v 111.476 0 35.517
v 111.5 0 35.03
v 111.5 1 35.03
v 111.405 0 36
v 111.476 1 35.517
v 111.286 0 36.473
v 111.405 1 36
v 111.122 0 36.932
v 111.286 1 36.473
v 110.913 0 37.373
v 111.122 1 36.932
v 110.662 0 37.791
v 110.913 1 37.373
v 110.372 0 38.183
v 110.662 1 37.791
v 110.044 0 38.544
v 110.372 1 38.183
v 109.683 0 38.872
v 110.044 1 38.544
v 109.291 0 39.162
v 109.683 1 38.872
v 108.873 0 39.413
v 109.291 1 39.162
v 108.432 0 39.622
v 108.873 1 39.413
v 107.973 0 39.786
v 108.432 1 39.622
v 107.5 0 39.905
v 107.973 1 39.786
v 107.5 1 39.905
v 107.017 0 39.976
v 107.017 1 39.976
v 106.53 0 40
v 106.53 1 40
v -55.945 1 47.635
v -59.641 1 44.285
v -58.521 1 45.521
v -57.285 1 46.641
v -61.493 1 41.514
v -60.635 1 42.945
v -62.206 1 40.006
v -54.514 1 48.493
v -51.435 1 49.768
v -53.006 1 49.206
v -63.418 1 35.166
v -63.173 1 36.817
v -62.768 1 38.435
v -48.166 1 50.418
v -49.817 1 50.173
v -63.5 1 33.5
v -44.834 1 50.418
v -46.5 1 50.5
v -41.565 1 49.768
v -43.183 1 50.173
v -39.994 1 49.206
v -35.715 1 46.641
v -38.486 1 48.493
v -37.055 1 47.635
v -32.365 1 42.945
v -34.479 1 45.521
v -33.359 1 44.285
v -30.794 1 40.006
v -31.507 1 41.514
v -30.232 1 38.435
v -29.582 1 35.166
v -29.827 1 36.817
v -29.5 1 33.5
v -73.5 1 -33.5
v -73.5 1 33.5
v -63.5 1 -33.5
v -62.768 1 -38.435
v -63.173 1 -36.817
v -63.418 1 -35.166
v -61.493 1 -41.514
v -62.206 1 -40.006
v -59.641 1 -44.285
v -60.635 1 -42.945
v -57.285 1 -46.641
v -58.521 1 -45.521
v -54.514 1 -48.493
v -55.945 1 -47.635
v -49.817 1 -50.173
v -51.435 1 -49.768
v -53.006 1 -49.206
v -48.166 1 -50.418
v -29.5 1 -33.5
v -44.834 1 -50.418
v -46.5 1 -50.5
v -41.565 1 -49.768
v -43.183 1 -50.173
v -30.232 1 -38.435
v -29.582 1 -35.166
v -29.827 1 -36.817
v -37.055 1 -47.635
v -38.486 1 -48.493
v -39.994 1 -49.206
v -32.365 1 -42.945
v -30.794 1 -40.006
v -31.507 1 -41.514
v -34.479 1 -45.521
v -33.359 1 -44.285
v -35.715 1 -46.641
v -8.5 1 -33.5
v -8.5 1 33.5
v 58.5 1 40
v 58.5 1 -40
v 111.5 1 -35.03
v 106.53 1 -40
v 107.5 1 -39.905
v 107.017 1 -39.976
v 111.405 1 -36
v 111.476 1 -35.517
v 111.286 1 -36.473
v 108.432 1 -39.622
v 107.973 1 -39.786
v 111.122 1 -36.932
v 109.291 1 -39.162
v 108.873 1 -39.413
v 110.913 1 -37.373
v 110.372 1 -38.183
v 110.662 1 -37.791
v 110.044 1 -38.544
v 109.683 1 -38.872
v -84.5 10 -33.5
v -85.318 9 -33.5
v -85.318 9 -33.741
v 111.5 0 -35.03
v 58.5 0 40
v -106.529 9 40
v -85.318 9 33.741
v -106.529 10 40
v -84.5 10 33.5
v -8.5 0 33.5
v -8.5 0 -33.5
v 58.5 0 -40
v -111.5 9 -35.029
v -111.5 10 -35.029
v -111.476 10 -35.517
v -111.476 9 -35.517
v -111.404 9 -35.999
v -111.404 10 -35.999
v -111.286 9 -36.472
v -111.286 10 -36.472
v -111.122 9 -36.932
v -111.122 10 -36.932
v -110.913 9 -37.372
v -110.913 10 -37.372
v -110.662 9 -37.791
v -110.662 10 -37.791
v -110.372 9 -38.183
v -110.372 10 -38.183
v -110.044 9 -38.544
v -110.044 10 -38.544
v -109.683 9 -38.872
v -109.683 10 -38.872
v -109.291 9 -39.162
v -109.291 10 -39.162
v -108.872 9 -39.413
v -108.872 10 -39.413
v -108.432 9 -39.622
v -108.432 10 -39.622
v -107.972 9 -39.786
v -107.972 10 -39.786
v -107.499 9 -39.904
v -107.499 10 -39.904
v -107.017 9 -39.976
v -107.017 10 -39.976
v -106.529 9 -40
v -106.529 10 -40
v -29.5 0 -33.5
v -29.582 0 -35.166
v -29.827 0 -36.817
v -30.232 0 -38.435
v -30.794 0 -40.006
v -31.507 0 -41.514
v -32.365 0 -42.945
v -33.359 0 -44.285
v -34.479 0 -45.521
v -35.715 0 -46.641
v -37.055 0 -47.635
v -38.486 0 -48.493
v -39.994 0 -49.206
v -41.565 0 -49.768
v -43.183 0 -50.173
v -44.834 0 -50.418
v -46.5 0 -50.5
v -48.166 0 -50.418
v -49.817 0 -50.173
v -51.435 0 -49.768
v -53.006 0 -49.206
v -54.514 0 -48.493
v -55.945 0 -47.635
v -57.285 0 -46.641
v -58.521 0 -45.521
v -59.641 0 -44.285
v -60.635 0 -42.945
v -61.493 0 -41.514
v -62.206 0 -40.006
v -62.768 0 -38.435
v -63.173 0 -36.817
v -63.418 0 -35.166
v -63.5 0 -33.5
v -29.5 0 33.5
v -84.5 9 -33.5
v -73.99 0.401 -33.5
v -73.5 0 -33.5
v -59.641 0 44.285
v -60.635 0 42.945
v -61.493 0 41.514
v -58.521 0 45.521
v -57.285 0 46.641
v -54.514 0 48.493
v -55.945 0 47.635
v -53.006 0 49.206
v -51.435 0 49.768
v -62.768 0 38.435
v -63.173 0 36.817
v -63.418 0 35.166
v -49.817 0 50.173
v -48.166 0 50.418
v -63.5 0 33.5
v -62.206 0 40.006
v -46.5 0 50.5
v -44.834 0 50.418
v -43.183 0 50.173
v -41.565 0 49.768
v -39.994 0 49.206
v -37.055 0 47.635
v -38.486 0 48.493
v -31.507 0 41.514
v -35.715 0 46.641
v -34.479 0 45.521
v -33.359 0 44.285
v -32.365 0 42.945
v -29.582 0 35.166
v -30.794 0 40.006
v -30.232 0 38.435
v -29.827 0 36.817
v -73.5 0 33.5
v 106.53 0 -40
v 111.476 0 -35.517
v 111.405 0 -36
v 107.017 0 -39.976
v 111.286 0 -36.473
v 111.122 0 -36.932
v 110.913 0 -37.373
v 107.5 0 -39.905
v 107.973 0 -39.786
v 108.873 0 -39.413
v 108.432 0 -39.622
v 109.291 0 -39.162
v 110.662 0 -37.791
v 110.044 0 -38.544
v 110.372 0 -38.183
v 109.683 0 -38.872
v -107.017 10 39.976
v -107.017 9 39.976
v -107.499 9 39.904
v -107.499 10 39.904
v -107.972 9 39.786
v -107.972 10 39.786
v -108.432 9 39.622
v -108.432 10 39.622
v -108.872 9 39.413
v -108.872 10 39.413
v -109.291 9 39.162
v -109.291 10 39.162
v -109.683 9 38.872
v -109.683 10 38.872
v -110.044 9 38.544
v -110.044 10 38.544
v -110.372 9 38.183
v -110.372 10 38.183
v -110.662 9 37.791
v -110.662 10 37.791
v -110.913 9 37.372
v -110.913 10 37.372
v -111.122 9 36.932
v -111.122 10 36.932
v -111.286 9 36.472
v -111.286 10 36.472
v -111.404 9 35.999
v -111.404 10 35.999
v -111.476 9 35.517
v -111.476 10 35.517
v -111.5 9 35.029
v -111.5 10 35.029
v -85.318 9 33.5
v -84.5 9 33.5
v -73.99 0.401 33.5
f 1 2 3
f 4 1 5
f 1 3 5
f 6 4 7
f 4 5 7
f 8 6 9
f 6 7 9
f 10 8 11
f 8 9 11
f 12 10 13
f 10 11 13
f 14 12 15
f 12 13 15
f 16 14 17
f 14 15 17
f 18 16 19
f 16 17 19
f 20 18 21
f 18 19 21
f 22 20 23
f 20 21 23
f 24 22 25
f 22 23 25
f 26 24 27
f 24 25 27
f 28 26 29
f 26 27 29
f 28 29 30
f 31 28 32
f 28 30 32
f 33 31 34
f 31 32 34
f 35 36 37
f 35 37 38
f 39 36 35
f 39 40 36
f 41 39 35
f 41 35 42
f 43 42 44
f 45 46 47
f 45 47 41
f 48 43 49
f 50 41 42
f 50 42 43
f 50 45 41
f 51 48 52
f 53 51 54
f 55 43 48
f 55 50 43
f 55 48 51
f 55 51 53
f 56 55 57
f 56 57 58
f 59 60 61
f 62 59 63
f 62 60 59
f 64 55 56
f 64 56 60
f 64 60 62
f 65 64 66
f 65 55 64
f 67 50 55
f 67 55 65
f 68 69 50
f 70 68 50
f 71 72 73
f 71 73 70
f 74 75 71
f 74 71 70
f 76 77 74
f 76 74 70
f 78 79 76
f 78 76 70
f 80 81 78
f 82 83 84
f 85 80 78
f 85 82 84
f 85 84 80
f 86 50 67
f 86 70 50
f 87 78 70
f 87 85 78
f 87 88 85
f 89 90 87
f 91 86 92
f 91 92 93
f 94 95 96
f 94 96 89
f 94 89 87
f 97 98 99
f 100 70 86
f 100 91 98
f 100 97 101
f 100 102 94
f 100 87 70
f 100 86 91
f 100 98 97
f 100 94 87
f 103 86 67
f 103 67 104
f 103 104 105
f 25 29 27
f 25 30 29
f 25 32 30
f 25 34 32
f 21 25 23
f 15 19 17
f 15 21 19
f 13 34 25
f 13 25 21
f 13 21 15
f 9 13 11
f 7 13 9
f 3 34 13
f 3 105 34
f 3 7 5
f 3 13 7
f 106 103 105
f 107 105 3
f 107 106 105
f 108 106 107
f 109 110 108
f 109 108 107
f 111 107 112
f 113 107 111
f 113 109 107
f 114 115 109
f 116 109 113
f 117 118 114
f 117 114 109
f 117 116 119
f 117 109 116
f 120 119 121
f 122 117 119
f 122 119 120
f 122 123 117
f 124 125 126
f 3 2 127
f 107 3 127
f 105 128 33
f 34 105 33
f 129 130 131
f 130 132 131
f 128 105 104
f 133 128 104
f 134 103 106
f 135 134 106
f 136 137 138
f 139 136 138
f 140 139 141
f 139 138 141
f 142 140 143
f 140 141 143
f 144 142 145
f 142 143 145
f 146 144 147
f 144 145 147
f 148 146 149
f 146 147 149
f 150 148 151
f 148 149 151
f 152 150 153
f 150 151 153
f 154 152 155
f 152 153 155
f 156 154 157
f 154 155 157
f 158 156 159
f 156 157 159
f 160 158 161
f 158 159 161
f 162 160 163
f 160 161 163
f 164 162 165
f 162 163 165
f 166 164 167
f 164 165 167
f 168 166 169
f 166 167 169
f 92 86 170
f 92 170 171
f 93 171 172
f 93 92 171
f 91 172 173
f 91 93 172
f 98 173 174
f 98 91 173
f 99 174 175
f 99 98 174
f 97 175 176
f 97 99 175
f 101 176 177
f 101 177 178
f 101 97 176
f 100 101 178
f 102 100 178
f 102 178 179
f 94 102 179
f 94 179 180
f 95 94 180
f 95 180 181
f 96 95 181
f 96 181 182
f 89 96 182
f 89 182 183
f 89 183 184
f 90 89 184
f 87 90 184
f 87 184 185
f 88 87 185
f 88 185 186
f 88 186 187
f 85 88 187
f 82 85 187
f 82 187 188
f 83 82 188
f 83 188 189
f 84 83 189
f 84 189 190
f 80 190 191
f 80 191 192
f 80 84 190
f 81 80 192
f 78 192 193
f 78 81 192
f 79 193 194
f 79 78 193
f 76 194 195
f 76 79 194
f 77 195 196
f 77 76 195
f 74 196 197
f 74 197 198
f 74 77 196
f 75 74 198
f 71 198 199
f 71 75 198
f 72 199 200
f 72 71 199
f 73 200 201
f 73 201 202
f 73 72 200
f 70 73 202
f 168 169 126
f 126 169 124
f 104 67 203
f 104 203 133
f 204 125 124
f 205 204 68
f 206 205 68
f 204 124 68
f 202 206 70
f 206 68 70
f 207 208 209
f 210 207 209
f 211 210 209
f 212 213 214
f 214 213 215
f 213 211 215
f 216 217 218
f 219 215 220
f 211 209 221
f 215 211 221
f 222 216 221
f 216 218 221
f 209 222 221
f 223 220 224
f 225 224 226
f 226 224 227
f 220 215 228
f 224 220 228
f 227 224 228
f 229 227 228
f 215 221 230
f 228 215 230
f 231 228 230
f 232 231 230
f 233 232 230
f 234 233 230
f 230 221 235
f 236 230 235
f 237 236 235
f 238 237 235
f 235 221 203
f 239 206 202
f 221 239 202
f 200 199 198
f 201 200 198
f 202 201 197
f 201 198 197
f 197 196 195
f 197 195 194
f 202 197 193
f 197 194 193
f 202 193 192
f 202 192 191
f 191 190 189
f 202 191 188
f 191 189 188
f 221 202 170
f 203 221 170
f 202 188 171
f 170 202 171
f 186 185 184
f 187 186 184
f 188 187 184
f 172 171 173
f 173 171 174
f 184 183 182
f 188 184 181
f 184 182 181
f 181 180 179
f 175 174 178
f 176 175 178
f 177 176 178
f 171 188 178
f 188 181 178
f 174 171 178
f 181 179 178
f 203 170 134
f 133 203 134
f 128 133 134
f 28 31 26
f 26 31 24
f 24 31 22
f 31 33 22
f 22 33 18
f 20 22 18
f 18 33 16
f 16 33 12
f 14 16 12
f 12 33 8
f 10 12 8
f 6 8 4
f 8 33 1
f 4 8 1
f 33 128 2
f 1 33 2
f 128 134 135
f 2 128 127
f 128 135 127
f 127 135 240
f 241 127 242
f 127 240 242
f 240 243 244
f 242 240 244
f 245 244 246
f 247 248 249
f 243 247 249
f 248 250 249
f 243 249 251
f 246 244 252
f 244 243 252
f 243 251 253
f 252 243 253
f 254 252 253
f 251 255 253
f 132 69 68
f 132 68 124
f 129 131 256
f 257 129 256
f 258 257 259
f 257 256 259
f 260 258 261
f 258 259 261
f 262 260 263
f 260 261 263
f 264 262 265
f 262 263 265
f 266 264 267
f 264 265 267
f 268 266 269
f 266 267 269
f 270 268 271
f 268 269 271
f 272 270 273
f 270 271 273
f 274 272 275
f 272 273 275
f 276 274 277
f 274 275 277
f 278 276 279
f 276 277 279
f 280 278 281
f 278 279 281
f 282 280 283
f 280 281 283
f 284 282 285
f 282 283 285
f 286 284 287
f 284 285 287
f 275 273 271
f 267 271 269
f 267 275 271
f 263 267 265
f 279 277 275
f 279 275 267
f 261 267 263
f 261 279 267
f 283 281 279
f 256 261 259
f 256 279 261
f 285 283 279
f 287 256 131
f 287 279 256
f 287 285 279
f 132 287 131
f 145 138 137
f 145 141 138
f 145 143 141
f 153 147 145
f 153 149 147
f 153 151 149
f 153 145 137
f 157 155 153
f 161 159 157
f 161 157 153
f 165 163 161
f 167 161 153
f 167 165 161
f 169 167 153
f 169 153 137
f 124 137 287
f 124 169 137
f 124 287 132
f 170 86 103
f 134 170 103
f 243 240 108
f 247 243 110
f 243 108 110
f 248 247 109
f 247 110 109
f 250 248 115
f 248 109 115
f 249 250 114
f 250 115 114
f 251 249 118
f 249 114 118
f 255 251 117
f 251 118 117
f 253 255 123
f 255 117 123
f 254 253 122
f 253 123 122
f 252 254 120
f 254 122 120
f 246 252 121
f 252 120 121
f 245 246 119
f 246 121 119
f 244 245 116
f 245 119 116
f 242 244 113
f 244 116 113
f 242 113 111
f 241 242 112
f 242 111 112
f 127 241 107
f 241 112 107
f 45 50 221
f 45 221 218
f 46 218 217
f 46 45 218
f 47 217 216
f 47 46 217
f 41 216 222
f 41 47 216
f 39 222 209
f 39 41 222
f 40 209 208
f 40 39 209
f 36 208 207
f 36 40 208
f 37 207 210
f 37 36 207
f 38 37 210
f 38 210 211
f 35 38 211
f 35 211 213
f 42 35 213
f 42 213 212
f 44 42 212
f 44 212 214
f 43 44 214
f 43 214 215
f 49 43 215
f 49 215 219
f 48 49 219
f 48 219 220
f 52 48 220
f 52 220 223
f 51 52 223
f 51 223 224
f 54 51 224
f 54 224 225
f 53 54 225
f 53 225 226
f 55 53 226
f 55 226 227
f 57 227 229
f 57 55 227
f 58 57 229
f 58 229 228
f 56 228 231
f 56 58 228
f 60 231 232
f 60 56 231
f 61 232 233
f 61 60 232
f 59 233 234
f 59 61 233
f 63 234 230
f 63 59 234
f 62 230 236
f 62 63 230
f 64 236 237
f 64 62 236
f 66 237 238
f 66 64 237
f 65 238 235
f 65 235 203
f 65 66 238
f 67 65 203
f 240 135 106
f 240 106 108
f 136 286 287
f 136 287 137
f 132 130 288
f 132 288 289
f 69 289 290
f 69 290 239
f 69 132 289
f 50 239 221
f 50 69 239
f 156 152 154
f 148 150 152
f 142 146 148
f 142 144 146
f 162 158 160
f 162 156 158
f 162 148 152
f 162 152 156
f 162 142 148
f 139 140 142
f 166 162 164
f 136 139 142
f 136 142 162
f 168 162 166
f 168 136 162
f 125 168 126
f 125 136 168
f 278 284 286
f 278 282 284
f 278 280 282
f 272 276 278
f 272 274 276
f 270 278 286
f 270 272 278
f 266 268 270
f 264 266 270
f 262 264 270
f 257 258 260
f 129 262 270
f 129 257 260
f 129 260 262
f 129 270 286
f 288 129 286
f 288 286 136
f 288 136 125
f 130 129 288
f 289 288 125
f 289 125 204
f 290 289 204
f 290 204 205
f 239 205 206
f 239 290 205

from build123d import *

# Parameters (mm, degrees)
SKETCH_1_W          = 223
SKETCH_1_H          = 80
EXTRUDE_1_DEPTH     = 10
SKETCH_3_OUTSIDE_W  = 272.426
SKETCH_3_OUTSIDE_H  = 59.426
CUT_EXTRUDE_1_DEPTH = 138.594512972
CUT_EXTRUDE_2_DEPTH = 119.879140306
CUT_EXTRUDE_3_DEPTH = 119.879140306
SKETCH_7_W          = 14.212670403
SKETCH_7_H          = 6.5
CUT_EXTRUDE_4_DEPTH = 153.966188104
SKETCH_9_W          = 65
SKETCH_9_H          = 6.5
CUT_EXTRUDE_6_DEPTH = 119.799200334
SKETCH_10_W         = 0.633237791
SKETCH_10_H         = 6.5
CUT_EXTRUDE_7_DEPTH = 154.59483235
CUT_EXTRUDE_8_DEPTH = 119.799200334
CUT_EXTRUDE_9_DEPTH = 119.799200334
EXTRUDE_2_DEPTH     = 1


with BuildPart() as part:
    # 스케치1 → 보스-돌출1 (new body)
    with BuildSketch(Plane(origin=(0, 0, 0), x_dir=(1, 0, 0), z_dir=(0, 1, 0))):
        Rectangle(SKETCH_1_W, SKETCH_1_H)
    extrude(amount=EXTRUDE_1_DEPTH)

    # 스케치3 outside → 컷-돌출1 (cut, through all)
    with BuildSketch(Plane.XY.offset(40)):
        with Locations((0, 5)):
            Rectangle(SKETCH_3_OUTSIDE_W, SKETCH_3_OUTSIDE_H)
        Polygon((-111.5, 10), (-111.5, 9), (-84.5, 9), (-73.5, 0), (111.5, 0), (111.5, 1), (-73.5, 1), (-84.5, 10), align=None, mode=Mode.SUBTRACT)
    extrude(amount=-CUT_EXTRUDE_1_DEPTH, mode=Mode.SUBTRACT)

    # 스케치5 → 컷-돌출2 (cut, through all)
    with BuildSketch(Plane(origin=(0, 10, 0), x_dir=(1, 0, 0), z_dir=(0, 1, 0))):
        with BuildLine():
            Line((-111.5, 40), (-111.5, 35.029307783))
            ThreePointArc((-111.5, 35.029307783), (-110.044117957, 38.544117957), (-106.529307783, 40))
            Line((-106.529307783, 40), (-111.5, 40))
        make_face()
        with BuildLine():
            ThreePointArc((-106.529307783, -40), (-110.044117957, -38.544117957), (-111.5, -35.029307783))
            Line((-111.5, -35.029307783), (-111.5, -40))
            Line((-111.5, -40), (-106.529307783, -40))
        make_face()
    extrude(amount=-CUT_EXTRUDE_2_DEPTH, mode=Mode.SUBTRACT)

    # 스케치6 → 컷-돌출3 (cut, through all)
    with BuildSketch(Plane(origin=(0, 10, 0), x_dir=(1, 0, 0), z_dir=(0, 1, 0))):
        Polygon((-106.529307783, 40), (-84.5, 33.5), (-84.5, 40), align=None)
        Polygon((-84.5, -40), (-84.5, -33.5), (-106.529307783, -40), align=None)
    extrude(amount=-CUT_EXTRUDE_3_DEPTH, mode=Mode.SUBTRACT)

    # 스케치7 → 컷-돌출4 (cut, through all)
    with BuildSketch(Plane(origin=(-28.982673267, -35.423267327, 0), x_dir=(0.7739572992033207, -0.6332377902572633, 0), z_dir=(0.6332377902572633, 0.7739572992033207, 0))):
        with Locations((-64.625434484, -36.75)):
            Rectangle(SKETCH_7_W, SKETCH_7_H)
        with Locations((-64.625434484, 36.75)):
            Rectangle(SKETCH_7_W, SKETCH_7_H)
    extrude(amount=-CUT_EXTRUDE_4_DEPTH, mode=Mode.SUBTRACT)

    # 스케치9 → 컷-돌출6 (cut, through all)
    with BuildSketch(Plane(origin=(0, 1, 0), x_dir=(1, 0, 0), z_dir=(0, 1, 0))):
        with Locations((-41, 36.75)):
            Rectangle(SKETCH_9_W, SKETCH_9_H)
        with Locations((-41, -36.75)):
            Rectangle(SKETCH_9_W, SKETCH_9_H)
    extrude(amount=-CUT_EXTRUDE_6_DEPTH, mode=Mode.SUBTRACT)

    # 스케치10 → 컷-돌출7 (cut, through all)
    with BuildSketch(Plane(origin=(-29.472772277, -36.022277228, 0), x_dir=(0.7739572992033206, -0.6332377902572633, 0), z_dir=(-0.6332377902572633, -0.7739572992033206, 0))):
        with Locations((-57.202480386, -36.75)):
            Rectangle(SKETCH_10_W, SKETCH_10_H)
        with Locations((-57.202480386, 36.75)):
            Rectangle(SKETCH_10_W, SKETCH_10_H)
    extrude(amount=-CUT_EXTRUDE_7_DEPTH, mode=Mode.SUBTRACT)

    # 스케치11 → 컷-돌출8 (cut, through all)
    with BuildSketch(Plane(origin=(0, 1, 0), x_dir=(1, 0, 0), z_dir=(0, 1, 0))):
        Polygon((-8.5, -40), (58.5, -40), (-8.5, -33.5), align=None)
        Polygon((-8.5, 33.5), (58.5, 40), (-8.5, 40), align=None)
    extrude(amount=-CUT_EXTRUDE_8_DEPTH, mode=Mode.SUBTRACT)

    # 스케치12 → 컷-돌출9 (cut, through all)
    with BuildSketch(Plane(origin=(0, 1, 0), x_dir=(1, 0, 0), z_dir=(0, 1, 0))):
        with BuildLine():
            Line((111.5, 40), (106.53, 40))
            ThreePointArc((106.53, 40), (110.044320702, 38.544320702), (111.5, 35.03))
            Line((111.5, 35.03), (111.5, 40))
        make_face()
        with BuildLine():
            Line((111.5, -40), (111.5, -35.03))
            ThreePointArc((111.5, -35.03), (110.044320702, -38.544320702), (106.53, -40))
            Line((106.53, -40), (111.5, -40))
        make_face()
    extrude(amount=-CUT_EXTRUDE_9_DEPTH, mode=Mode.SUBTRACT)

    # 스케치13 → 보스-돌출2 (add)
    with BuildSketch(Plane(origin=(0, 1, 0), x_dir=(1, 0, 0), z_dir=(0, 1, 0))):
        with BuildLine():
            Line((-29.5, 33.5), (-63.5, 33.5))
            ThreePointArc((-63.5, 33.5), (-46.5, 16.5), (-29.5, 33.5))
        make_face()
        with BuildLine():
            ThreePointArc((-29.5, 33.5), (-46.5, 50.5), (-63.5, 33.5))
            Line((-63.5, 33.5), (-29.5, 33.5))
        make_face()
        with BuildLine():
            ThreePointArc((-29.5, -33.5), (-46.5, -16.5), (-63.5, -33.5))
            Line((-63.5, -33.5), (-29.5, -33.5))
        make_face()
        with BuildLine():
            Line((-29.5, -33.5), (-63.5, -33.5))
            ThreePointArc((-63.5, -33.5), (-46.5, -50.5), (-29.5, -33.5))
        make_face()
    extrude(amount=-EXTRUDE_2_DEPTH)


solid = part.part
